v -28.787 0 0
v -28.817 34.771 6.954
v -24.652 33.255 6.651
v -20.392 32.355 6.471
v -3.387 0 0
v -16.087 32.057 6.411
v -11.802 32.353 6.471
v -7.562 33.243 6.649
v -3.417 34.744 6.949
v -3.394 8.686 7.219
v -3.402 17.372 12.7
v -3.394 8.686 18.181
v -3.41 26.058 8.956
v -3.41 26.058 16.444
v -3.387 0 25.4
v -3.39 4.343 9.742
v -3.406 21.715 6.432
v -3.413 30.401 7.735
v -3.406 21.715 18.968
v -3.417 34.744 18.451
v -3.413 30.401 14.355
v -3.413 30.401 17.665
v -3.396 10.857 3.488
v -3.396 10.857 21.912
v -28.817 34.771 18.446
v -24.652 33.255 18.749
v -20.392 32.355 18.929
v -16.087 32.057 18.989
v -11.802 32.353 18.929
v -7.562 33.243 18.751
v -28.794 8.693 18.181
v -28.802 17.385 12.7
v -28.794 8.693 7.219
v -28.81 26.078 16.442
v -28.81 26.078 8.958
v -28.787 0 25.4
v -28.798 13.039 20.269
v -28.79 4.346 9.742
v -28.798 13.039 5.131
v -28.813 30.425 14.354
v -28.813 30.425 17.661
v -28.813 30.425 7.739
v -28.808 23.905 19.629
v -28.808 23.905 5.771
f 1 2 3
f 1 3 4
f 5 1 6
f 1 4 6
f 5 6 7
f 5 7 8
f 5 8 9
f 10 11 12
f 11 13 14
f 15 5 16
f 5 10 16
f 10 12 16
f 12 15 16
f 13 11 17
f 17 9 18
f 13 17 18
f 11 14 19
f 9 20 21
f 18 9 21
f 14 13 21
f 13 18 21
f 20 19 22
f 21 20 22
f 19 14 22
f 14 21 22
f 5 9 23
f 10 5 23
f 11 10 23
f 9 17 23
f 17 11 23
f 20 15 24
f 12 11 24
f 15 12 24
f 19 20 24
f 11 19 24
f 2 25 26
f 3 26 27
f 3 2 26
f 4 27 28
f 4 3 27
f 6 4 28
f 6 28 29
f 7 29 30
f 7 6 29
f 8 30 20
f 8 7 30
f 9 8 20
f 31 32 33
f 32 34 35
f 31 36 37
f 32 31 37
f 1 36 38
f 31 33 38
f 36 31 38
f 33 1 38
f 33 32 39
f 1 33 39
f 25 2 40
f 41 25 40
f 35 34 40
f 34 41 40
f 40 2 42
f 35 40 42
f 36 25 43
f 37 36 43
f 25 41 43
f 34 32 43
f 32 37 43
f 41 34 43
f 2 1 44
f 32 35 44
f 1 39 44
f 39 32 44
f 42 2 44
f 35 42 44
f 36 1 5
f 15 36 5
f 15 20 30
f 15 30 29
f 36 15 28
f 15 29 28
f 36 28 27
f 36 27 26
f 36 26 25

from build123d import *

# Parameters (mm, degrees)
F3_W     = 25.4
F3_H     = 25.4
F2_W     = 25.4
F2_H     = 10.16
F5_DEPTH = 25.4


with BuildPart() as f4:
    # F3 (on Front) → F4 section 0
    with BuildSketch(Plane.XZ):
        with Locations((-16.086667, 12.7)):
            Rectangle(F3_W, F3_H)
    # F2 (on offset) → F4 section 1
    with BuildSketch(Plane.XZ.offset(-38.1)):
        with Locations((-16.120172, 12.7)):
            Rectangle(F2_W, F2_H)
    loft()

    # F0 (on Top) → F5 (cut)
    with BuildSketch(Plane.XY):
        with BuildLine():
            ThreePointArc((-16.086667, 32.057061), (5.986803, 41.200191), (15.129933, 63.273661))
            ThreePointArc((15.129933, 63.273661), (-38.160136, 85.34713), (-16.086667, 32.057061))
        make_face()
    extrude(amount=F5_DEPTH, mode=Mode.SUBTRACT)


solid = f4.part
